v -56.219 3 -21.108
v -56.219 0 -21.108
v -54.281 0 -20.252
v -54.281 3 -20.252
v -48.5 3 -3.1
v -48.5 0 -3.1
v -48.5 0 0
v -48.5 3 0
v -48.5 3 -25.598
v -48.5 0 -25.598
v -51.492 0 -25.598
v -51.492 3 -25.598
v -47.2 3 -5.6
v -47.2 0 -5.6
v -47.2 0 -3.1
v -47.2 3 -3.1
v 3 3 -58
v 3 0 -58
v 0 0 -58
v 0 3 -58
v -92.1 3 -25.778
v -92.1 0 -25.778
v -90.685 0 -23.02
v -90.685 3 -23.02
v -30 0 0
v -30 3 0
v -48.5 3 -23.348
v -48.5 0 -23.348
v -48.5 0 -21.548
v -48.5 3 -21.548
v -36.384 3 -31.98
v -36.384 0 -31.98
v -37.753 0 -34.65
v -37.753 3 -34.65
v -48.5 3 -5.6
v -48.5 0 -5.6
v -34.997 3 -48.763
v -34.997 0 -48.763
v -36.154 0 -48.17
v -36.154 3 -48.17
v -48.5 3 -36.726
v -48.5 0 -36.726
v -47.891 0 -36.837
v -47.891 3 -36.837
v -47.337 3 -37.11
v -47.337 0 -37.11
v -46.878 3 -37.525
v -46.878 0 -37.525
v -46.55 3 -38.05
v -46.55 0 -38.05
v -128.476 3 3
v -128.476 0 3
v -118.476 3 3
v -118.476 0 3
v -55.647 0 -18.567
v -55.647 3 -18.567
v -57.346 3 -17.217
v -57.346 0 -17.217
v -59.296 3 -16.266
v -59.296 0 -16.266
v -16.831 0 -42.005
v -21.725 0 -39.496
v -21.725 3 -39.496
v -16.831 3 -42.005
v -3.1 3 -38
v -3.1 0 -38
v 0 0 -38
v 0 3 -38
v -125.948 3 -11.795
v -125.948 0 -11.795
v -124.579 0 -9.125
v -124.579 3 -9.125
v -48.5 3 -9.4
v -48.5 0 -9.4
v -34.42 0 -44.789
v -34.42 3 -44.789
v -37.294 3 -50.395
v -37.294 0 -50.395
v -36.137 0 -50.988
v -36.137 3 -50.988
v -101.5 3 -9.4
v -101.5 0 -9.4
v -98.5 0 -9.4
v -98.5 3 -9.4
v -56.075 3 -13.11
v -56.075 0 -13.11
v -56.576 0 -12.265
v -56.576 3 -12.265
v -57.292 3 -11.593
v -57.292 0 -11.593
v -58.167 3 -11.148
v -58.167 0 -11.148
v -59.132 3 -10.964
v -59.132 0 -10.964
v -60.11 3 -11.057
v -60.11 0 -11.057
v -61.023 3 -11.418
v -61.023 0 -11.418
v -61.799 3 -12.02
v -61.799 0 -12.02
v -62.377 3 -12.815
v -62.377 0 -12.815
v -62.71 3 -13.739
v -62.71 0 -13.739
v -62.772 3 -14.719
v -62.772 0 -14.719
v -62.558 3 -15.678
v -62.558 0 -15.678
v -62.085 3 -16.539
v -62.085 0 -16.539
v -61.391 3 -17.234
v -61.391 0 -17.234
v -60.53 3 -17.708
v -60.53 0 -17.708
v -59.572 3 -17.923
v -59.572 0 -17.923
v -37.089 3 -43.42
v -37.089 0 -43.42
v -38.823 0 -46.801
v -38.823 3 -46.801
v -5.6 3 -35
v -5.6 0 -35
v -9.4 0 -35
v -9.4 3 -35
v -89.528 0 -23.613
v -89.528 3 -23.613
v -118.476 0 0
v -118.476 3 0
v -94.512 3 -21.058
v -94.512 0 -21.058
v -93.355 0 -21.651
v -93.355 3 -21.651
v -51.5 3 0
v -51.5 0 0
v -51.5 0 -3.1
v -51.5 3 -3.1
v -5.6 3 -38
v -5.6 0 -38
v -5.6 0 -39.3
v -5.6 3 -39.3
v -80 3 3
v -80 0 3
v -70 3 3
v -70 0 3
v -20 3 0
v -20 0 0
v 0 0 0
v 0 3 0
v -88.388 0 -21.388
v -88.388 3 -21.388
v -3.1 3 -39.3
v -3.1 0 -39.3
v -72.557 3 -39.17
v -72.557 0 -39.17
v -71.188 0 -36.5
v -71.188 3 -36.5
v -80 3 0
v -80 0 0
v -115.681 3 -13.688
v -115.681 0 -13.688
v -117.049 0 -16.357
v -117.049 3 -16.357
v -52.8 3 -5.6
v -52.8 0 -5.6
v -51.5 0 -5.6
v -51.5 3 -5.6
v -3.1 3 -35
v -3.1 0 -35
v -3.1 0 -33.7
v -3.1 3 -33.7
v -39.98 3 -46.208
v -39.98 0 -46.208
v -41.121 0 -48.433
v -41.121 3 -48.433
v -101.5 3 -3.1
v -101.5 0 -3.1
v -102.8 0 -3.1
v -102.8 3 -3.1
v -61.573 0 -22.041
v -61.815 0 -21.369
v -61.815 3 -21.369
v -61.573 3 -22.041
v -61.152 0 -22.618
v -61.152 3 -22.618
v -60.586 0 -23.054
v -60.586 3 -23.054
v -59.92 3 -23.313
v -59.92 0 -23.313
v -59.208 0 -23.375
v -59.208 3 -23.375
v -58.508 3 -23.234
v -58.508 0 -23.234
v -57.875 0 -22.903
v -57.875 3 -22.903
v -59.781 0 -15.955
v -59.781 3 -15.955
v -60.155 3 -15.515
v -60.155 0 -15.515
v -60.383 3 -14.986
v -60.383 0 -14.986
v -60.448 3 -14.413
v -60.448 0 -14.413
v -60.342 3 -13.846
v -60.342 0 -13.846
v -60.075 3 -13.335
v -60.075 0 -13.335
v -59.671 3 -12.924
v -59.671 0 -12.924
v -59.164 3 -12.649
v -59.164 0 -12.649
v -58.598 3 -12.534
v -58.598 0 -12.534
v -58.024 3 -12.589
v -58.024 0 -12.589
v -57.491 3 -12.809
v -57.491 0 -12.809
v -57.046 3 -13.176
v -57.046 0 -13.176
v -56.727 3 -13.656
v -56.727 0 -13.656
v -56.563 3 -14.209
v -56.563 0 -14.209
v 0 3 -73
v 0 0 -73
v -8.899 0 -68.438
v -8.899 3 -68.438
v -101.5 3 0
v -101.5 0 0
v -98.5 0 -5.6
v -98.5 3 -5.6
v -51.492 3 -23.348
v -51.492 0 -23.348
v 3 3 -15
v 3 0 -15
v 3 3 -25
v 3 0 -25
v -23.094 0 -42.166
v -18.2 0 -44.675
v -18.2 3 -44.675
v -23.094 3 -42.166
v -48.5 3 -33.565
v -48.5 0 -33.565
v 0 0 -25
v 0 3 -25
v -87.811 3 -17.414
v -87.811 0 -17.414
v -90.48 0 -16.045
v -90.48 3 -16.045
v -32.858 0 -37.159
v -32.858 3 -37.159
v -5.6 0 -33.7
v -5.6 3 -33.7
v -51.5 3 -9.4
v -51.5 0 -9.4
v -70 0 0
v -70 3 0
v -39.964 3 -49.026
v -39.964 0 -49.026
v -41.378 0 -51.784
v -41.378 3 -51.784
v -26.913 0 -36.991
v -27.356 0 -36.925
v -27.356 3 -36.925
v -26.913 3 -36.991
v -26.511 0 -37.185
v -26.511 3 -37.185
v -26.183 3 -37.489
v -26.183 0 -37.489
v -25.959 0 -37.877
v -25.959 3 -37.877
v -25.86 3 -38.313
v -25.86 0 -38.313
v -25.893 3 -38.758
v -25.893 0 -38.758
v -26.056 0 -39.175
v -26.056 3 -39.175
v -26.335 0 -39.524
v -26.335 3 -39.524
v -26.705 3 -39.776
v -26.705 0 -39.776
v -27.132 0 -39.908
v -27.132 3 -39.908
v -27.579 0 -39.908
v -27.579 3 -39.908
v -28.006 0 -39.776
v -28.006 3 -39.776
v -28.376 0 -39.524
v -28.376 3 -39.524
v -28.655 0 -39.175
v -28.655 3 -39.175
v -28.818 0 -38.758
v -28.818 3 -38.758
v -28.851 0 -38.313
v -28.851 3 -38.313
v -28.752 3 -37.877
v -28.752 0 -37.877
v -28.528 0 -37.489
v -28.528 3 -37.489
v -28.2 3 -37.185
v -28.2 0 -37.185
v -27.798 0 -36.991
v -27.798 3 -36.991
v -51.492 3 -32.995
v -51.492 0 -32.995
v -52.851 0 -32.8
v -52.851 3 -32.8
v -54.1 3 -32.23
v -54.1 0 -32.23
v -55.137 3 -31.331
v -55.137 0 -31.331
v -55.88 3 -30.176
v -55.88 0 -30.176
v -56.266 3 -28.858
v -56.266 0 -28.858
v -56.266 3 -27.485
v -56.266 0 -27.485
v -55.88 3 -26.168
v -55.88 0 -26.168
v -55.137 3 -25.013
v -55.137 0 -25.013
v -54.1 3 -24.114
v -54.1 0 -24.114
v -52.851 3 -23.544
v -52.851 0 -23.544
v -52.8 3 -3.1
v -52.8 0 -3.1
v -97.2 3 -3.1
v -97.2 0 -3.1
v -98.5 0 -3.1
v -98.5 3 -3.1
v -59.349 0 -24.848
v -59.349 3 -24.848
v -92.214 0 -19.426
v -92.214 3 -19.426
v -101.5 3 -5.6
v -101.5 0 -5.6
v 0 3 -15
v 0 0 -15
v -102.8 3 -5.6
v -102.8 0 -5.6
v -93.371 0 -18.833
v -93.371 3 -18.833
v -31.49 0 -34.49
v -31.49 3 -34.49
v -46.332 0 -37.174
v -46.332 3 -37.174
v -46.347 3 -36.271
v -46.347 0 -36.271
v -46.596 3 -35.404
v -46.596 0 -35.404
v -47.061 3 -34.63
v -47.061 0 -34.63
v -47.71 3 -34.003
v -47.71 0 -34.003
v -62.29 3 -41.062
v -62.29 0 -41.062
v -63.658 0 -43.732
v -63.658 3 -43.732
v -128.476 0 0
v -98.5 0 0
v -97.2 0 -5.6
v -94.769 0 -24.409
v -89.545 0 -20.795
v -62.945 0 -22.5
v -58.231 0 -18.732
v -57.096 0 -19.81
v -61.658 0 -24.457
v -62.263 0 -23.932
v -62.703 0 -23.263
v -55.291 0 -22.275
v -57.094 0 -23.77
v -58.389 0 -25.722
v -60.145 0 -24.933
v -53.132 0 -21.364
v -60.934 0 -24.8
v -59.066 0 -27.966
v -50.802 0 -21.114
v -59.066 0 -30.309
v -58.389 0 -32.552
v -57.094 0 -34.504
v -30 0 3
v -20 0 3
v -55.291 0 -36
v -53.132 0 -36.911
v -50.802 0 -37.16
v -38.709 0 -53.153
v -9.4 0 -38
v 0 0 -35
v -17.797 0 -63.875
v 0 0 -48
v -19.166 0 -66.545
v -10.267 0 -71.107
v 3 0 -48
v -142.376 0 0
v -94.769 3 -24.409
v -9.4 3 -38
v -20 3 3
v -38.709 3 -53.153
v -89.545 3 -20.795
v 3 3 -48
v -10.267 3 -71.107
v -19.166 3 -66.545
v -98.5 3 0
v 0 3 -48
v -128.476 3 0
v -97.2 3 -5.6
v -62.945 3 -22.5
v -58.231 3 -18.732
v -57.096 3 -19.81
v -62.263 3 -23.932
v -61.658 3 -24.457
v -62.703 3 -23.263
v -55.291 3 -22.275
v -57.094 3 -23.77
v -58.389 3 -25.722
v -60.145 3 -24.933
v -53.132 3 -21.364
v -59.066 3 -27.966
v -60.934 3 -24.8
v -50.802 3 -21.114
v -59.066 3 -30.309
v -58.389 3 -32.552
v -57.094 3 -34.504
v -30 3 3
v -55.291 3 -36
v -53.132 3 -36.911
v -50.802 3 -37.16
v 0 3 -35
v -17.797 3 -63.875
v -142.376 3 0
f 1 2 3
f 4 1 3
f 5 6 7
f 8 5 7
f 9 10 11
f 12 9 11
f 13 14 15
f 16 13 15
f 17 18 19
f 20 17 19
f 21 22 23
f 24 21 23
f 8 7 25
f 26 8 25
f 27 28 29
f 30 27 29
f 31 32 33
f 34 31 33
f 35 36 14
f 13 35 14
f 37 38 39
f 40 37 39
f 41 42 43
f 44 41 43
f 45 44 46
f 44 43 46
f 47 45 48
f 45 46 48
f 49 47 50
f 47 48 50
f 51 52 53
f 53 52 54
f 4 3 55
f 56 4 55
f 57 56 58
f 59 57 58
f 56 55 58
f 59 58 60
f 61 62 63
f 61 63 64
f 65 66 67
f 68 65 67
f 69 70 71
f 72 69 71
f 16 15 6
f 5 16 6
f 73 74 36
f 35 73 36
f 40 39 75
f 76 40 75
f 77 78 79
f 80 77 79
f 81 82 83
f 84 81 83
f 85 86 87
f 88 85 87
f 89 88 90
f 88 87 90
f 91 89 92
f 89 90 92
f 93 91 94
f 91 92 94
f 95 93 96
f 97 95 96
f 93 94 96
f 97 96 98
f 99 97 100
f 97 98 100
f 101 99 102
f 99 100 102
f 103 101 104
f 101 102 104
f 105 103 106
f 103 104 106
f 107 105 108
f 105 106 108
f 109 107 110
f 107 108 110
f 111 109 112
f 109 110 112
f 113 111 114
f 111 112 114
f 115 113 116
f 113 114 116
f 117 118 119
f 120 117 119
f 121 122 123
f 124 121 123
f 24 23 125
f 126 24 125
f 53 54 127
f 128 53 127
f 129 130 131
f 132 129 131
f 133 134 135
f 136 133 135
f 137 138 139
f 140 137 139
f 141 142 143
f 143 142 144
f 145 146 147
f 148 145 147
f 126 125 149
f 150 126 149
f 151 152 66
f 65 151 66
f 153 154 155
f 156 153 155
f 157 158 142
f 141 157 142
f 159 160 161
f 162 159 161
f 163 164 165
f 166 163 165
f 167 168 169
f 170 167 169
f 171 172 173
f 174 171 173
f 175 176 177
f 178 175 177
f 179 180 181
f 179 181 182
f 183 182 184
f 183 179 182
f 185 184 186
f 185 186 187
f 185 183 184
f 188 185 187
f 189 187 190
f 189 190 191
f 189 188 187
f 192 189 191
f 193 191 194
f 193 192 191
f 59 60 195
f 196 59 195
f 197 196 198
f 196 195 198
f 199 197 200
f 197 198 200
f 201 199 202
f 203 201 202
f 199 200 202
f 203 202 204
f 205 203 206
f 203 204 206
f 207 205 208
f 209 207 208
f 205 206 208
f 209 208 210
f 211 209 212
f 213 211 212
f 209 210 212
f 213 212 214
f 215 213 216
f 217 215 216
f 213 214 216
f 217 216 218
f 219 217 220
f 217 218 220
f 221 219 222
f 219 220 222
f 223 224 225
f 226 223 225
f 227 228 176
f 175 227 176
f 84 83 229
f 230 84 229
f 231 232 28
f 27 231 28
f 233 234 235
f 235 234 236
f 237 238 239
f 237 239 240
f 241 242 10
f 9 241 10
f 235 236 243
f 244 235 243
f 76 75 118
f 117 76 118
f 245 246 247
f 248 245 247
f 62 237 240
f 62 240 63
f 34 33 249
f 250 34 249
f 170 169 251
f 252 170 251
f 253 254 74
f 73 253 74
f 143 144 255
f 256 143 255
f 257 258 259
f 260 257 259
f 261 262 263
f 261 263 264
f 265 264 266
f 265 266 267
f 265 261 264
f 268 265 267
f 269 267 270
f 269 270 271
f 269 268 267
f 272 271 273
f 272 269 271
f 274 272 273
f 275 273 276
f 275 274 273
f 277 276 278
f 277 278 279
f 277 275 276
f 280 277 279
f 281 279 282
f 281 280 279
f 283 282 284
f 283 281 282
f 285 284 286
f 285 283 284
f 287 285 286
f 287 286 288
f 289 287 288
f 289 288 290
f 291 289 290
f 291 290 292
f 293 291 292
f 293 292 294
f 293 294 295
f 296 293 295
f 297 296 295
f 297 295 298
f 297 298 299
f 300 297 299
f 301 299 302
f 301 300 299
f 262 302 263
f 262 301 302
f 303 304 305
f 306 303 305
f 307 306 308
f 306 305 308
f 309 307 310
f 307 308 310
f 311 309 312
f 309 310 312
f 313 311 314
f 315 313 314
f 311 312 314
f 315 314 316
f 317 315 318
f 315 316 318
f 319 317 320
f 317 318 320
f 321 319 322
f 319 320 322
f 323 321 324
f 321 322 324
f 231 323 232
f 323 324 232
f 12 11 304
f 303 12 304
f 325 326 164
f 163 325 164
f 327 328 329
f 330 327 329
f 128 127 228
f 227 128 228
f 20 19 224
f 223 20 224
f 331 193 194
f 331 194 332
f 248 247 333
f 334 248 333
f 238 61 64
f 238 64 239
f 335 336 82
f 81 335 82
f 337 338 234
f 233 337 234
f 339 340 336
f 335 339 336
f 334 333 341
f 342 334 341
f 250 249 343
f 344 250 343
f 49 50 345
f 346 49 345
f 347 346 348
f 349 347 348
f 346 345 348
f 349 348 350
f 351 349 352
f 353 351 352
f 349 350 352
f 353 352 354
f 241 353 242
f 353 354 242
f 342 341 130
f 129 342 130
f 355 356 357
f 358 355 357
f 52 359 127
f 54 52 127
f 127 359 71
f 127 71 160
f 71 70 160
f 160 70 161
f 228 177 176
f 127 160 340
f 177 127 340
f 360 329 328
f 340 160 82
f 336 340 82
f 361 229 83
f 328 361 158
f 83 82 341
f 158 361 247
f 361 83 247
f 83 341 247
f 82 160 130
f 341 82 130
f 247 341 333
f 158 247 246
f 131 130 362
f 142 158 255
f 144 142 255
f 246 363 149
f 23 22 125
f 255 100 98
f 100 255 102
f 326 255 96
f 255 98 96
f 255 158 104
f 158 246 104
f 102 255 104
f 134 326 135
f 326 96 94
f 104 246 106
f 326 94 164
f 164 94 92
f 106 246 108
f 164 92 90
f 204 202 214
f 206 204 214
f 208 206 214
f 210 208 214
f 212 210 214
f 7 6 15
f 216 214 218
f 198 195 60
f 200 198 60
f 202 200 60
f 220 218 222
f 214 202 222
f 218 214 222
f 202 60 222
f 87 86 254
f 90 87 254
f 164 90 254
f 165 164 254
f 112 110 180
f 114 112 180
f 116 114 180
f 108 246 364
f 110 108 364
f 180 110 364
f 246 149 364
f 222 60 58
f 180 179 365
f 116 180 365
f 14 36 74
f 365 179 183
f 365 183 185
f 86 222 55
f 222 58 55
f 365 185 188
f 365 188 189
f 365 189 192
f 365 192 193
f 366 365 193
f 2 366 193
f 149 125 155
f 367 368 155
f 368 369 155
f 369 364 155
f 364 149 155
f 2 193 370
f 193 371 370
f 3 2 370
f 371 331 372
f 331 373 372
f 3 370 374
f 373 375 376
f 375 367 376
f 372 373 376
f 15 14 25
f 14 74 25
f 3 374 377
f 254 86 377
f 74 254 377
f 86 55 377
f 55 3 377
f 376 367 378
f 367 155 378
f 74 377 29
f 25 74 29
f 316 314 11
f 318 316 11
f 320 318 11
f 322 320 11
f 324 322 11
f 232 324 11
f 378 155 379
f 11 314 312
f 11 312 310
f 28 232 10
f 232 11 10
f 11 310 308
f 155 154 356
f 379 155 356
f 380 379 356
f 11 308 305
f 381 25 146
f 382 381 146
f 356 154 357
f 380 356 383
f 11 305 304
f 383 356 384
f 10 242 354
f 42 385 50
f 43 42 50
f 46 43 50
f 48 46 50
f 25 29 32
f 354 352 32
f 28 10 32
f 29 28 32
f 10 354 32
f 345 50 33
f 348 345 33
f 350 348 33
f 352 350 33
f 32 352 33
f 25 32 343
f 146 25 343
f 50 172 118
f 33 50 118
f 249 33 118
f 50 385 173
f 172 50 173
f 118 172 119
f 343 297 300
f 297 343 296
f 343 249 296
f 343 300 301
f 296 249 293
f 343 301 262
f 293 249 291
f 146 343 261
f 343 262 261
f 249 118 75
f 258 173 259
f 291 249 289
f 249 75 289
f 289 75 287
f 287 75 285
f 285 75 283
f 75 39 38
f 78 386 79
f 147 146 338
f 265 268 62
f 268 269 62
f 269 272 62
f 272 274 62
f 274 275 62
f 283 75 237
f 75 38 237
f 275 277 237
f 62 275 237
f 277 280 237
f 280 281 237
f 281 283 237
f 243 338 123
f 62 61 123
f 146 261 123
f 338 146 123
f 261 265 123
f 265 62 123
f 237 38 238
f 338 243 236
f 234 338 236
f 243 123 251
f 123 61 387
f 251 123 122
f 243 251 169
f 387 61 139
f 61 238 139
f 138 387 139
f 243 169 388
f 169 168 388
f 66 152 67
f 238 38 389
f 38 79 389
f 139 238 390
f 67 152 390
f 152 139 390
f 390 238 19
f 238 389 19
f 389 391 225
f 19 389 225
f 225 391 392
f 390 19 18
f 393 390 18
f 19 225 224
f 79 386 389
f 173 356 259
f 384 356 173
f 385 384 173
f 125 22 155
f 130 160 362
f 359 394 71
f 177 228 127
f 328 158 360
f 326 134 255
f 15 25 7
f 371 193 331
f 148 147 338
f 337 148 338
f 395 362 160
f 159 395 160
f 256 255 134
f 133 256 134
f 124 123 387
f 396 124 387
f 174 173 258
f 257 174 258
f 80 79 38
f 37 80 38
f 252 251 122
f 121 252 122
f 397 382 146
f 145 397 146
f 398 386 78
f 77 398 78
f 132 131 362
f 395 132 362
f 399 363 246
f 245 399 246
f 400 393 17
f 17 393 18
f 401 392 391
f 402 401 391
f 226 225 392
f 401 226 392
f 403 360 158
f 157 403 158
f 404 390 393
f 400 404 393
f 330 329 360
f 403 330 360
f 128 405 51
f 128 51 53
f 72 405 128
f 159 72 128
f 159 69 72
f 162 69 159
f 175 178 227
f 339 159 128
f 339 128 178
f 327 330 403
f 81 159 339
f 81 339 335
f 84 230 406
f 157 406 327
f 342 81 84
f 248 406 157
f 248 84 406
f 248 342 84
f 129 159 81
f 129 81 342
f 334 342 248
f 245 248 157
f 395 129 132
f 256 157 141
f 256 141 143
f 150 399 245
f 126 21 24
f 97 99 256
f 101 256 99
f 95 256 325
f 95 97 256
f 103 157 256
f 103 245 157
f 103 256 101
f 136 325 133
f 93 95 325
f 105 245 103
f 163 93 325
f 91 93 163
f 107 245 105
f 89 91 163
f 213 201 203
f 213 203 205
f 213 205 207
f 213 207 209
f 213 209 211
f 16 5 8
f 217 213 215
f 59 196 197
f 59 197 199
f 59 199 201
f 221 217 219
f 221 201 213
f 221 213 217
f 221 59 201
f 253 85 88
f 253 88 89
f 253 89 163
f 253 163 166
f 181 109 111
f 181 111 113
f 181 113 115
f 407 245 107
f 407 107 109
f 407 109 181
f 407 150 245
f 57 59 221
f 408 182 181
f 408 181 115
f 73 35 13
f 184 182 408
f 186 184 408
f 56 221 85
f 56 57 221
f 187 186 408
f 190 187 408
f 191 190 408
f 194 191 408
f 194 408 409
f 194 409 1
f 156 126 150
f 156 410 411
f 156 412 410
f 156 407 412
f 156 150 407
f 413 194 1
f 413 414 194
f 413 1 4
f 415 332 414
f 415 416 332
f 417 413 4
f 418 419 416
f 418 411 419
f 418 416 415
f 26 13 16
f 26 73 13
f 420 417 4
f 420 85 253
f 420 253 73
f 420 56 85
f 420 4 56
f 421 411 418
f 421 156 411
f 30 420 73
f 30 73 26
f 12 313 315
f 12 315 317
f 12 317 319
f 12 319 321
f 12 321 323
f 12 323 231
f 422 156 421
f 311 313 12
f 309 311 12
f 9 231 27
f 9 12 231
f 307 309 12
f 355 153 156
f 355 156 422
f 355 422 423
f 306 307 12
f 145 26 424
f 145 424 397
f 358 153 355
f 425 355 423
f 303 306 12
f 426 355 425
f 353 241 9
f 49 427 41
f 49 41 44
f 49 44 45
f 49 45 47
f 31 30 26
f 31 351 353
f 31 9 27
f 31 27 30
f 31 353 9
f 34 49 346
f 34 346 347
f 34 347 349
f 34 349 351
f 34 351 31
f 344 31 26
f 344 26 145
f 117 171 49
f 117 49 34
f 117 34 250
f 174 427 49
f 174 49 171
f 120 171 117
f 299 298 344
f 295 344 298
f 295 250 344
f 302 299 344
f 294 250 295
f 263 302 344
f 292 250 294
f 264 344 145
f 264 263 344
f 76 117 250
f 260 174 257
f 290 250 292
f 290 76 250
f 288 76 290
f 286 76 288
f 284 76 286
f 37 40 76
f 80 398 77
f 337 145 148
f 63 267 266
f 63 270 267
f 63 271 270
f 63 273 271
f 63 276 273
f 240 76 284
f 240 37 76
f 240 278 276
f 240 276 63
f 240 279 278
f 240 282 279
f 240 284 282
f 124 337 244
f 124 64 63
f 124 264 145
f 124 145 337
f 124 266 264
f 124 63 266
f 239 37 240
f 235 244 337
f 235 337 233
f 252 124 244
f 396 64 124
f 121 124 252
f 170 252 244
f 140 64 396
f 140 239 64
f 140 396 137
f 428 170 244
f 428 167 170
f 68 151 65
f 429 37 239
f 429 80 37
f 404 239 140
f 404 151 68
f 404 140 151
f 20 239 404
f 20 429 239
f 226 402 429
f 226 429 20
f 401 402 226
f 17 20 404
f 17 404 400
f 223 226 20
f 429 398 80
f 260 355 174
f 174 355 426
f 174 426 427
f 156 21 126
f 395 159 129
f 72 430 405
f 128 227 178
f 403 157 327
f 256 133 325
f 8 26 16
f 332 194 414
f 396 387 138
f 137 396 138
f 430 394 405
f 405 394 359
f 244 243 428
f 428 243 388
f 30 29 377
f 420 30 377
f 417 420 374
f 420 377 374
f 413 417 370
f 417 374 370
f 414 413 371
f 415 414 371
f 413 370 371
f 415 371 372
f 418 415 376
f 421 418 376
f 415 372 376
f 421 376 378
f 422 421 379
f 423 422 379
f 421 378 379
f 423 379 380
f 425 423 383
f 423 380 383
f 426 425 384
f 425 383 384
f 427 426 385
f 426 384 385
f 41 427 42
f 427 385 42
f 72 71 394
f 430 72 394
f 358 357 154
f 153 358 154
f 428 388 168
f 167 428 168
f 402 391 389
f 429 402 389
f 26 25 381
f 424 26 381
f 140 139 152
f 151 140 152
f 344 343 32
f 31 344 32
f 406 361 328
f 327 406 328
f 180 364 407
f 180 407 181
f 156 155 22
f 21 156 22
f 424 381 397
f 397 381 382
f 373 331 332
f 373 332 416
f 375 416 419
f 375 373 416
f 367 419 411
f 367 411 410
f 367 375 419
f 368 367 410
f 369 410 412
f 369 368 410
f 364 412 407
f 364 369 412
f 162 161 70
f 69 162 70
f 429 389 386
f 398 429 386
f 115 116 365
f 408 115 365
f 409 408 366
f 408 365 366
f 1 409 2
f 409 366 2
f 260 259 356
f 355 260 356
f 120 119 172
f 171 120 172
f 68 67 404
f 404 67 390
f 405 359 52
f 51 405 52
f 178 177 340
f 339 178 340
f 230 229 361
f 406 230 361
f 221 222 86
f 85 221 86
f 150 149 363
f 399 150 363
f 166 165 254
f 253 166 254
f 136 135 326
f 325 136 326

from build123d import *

# Parameters (mm, degrees)
SKETCH1_R           = 1.5
BOSS_EXTRUDE1_DEPTH = 3


with BuildPart() as part:
    # Sketch1 → Boss-Extrude1 (new body)
    with BuildSketch(Plane(origin=(0, 0, 0), x_dir=(1, 0, 0), z_dir=(0, 1, 0))):
        Polygon((0, 73), (-8.898516379, 68.4375), (-10.267266379, 71.107054914), (-19.165782758, 66.544554914), (-17.797032758, 63.875), (-38.708546249, 53.153125), (-37.294171249, 50.394584922), (-36.13736412, 50.987709922), (-34.99673912, 48.763080828), (-36.153546249, 48.169955828), (-34.419796249, 44.788519604), (-37.089351163, 43.419769604), (-38.823101163, 46.801205828), (-39.979908292, 46.208080828), (-41.120533292, 48.432709922), (-39.963726163, 49.025834922), (-41.378101163, 51.784375), (-62.289614654, 41.0625), (-63.658364654, 43.732054914), (-72.556881033, 39.169554914), (-71.188131033, 36.5), (-92.099644524, 25.778125), (-90.685269524, 23.019584922), (-89.528462395, 23.612709922), (-88.387837395, 21.388080828), (-89.544644524, 20.794955828), (-87.810894524, 17.413519604), (-90.480449438, 16.044769604), (-92.214199438, 19.426205828), (-93.371006567, 18.833080828), (-94.511631567, 21.057709922), (-93.354824438, 21.650834922), (-94.769199438, 24.409375), (-115.680712929, 13.6875), (-117.049462929, 16.357054914), (-125.947979308, 11.794554914), (-124.579229308, 9.125), (-142.376262066, 0), (-128.476262066, 0), (-128.476262066, -3), (-118.476262066, -3), (-118.476262066, 0), (-101.5, 0), (-101.5, 3.1), (-102.8, 3.1), (-102.8, 5.6), (-101.5, 5.6), (-101.5, 9.4), (-98.5, 9.4), (-98.5, 5.6), (-97.2, 5.6), (-97.2, 3.1), (-98.5, 3.1), (-98.5, 0), (-80, 0), (-80, -3), (-70, -3), (-70, 0), (-51.5, 0), (-51.5, 3.1), (-52.8, 3.1), (-52.8, 5.6), (-51.5, 5.6), (-51.5, 9.4), (-48.5, 9.4), (-48.5, 5.6), (-47.2, 5.6), (-47.2, 3.1), (-48.5, 3.1), (-48.5, 0), (-30, 0), (-30, -3), (-20, -3), (-20, 0), (0, 0), (0, 15), (3, 15), (3, 25), (0, 25), (0, 35), (-3.1, 35), (-3.1, 33.7), (-5.6, 33.7), (-5.6, 35), (-9.4, 35), (-9.4, 38), (-5.6, 38), (-5.6, 39.3), (-3.1, 39.3), (-3.1, 38), (0, 38), (0, 48), (3, 48), (3, 58), (0, 58), align=None)
        with Locations(Location((-27.355510267, 38.424597543, 0), (0, 0, 270))):
            Circle(SKETCH1_R, mode=Mode.SUBTRACT)
        Polygon((-18.2, 44.675), (-23.094184009, 42.165625), (-21.725434009, 39.496070086), (-16.83125, 42.005445086), align=None, mode=Mode.SUBTRACT)
        Polygon((-32.858434402, 37.159240731), (-31.489684402, 34.489685817), (-36.383868411, 31.980310817), (-37.752618411, 34.649865731), align=None, mode=Mode.SUBTRACT)
        with BuildLine():
            Line((-48.5, 33.56496631), (-48.5, 25.598461138))
            Line((-48.5, 25.598461138), (-51.491944896, 25.598461138))
            Line((-51.491944896, 25.598461138), (-51.491944896, 32.995360227))
            ThreePointArc((-51.491944896, 32.995360227), (-56.315394441, 28.171910682), (-51.491944896, 23.348461138))
            Line((-51.491944896, 23.348461138), (-48.5, 23.348461138))
            Line((-48.5, 23.348461138), (-48.5, 21.548461138))
            ThreePointArc((-48.5, 21.548461138), (-59.151745227, 29.1370418), (-48.5, 36.725622462))
            ThreePointArc((-48.5, 36.725622462), (-47.33660311, 37.110417568), (-46.55, 38.05))
            ThreePointArc((-46.55, 38.05), (-46.596119109, 35.403624932), (-48.5, 33.56496631))
        make_face(mode=Mode.SUBTRACT)
        with BuildLine():
            Line((-62.945288743, 22.499922927), (-61.814756339, 21.369390522))
            ThreePointArc((-61.814756339, 21.369390522), (-60.26196681, 23.207262023), (-57.875304833, 22.902677745))
            Line((-57.875304833, 22.902677745), (-59.34866377, 24.848461138))
            ThreePointArc((-59.34866377, 24.848461138), (-61.658382233, 24.457375162), (-62.945288743, 22.499922927))
        make_face(mode=Mode.SUBTRACT)
        with BuildLine():
            Line((-56.219305992, 21.108017954), (-54.281025882, 20.251876901))
            ThreePointArc((-54.281025882, 20.251876901), (-56.459608889, 17.845467185), (-59.295560451, 16.26609694))
            ThreePointArc((-59.295560451, 16.26609694), (-59.670500049, 12.923855807), (-56.562556798, 14.209096735))
            Line((-56.562556798, 14.209096735), (-56.075146683, 13.110422752))
            ThreePointArc((-56.075146683, 13.110422752), (-62.116171263, 12.397132702), (-59.571948462, 17.922500654))
            ThreePointArc((-59.571948462, 17.922500654), (-57.634172668, 19.240087777), (-56.219305992, 21.108017954))
        make_face(mode=Mode.SUBTRACT)
    extrude(amount=BOSS_EXTRUDE1_DEPTH)


solid = part.part
